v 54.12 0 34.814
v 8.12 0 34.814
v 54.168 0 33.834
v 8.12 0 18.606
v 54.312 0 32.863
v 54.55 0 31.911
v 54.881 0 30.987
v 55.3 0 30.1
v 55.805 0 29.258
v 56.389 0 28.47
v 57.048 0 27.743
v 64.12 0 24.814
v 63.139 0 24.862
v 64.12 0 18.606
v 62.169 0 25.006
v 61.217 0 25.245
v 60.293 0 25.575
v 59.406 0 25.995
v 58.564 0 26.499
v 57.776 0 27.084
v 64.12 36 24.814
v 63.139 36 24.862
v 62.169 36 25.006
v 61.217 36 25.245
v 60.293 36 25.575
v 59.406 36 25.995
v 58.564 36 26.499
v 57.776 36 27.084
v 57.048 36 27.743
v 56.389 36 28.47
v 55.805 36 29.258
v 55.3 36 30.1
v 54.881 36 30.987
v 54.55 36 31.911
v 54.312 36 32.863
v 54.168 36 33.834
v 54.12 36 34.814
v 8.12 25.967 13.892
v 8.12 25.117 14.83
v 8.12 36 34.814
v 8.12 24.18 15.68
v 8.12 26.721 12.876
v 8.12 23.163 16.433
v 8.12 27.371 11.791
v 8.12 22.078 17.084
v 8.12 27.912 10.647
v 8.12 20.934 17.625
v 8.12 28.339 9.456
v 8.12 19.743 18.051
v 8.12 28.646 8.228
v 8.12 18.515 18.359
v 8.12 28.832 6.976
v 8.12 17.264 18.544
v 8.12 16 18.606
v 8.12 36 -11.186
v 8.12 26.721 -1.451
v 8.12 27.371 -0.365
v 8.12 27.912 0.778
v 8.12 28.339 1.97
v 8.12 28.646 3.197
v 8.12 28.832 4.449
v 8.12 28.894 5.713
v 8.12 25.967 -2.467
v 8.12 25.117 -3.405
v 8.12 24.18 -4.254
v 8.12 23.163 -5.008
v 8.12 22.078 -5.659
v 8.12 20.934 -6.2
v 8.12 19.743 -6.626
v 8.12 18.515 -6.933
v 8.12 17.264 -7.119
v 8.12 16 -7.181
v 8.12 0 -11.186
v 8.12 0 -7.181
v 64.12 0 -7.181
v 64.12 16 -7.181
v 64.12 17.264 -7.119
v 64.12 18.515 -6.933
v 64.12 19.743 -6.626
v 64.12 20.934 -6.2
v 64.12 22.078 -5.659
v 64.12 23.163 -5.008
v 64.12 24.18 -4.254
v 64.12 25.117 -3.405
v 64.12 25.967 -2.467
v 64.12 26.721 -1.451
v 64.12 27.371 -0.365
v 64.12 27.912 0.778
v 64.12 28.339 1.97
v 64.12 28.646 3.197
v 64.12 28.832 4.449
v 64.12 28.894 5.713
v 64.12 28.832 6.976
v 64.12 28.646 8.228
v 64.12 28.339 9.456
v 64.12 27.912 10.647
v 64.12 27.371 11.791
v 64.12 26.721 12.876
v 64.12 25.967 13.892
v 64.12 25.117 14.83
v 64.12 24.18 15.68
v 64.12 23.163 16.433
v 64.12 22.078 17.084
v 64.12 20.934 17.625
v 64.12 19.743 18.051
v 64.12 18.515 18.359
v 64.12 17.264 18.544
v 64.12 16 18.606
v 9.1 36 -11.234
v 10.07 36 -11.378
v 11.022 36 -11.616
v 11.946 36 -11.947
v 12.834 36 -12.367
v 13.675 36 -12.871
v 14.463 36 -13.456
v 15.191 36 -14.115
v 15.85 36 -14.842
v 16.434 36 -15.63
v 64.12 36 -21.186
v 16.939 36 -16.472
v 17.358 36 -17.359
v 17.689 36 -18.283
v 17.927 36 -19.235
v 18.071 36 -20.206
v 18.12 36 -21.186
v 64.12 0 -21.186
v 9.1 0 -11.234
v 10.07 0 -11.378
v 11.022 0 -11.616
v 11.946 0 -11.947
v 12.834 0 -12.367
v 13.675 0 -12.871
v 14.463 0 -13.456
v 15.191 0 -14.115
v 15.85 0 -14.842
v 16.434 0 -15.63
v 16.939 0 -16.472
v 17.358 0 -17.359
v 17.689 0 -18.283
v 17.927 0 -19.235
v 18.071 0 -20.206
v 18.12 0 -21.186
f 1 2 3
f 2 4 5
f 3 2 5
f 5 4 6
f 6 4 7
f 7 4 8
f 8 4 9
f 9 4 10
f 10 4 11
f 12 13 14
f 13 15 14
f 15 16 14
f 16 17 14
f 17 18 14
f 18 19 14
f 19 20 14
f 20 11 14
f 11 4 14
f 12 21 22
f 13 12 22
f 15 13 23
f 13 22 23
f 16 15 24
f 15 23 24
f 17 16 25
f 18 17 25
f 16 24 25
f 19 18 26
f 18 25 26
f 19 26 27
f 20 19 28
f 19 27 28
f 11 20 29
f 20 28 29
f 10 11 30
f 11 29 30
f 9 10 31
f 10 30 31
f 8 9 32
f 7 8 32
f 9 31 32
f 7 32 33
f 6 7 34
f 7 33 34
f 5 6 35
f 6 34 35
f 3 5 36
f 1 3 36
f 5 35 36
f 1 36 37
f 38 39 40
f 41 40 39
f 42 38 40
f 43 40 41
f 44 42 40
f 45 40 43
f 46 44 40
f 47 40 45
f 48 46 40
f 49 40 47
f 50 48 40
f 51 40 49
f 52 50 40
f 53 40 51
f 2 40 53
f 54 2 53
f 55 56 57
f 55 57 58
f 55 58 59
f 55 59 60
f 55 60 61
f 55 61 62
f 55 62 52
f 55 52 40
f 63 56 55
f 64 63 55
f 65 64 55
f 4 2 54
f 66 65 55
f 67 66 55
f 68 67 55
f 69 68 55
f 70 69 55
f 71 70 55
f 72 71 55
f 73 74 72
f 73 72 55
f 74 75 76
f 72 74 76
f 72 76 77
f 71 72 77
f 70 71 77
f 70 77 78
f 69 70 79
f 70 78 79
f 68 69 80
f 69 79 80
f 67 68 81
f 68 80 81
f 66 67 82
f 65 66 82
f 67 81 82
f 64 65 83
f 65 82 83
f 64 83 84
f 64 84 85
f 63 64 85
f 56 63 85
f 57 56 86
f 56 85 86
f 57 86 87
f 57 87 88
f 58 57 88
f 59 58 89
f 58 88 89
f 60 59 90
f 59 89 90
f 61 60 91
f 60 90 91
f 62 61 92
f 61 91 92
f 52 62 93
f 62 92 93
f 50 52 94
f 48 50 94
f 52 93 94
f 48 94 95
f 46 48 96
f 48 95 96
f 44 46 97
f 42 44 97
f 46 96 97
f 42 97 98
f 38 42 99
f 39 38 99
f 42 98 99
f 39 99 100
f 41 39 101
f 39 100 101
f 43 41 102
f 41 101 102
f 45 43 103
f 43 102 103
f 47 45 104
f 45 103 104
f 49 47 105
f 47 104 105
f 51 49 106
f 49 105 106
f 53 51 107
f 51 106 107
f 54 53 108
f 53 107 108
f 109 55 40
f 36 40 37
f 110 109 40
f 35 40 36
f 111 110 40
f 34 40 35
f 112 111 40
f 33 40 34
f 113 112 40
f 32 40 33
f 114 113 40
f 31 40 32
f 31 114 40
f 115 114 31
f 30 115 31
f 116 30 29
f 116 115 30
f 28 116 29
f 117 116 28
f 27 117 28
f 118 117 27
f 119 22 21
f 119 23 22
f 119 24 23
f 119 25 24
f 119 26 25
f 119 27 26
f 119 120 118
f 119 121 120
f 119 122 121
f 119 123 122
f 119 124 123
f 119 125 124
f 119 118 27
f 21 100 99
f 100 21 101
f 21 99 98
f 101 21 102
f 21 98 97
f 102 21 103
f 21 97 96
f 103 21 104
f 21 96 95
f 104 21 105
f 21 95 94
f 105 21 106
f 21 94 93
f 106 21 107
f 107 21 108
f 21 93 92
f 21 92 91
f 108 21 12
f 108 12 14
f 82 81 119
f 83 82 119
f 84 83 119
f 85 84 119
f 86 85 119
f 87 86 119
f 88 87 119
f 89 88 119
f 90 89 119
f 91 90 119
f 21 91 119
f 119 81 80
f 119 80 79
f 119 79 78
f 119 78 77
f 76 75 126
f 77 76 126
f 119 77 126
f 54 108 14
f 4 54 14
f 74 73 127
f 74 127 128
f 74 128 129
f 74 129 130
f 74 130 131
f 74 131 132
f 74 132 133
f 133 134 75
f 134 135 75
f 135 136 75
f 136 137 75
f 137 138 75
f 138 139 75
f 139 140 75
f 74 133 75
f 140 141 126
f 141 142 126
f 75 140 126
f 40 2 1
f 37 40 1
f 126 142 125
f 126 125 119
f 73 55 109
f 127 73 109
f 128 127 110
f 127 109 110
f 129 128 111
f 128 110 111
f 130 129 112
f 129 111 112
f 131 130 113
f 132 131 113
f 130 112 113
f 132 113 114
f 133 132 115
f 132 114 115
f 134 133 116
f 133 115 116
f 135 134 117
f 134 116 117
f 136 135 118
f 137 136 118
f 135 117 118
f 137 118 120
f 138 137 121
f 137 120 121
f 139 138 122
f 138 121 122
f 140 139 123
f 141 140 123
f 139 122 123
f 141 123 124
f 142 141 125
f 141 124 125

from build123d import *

# Parameters (mm, degrees)
SKETCH_1_W          = 56
SKETCH_1_H          = 56
EXTRUDE_1_DEPTH     = 36
SKETCH_3_R          = 12.893800992
CUT_EXTRUDE_5_DEPTH = 56
CUT_EXTRUDE_6_DEPTH = 56


with BuildPart() as part:
    # 草图1 → 凸台-拉伸1 (new body)
    with BuildSketch(Plane(origin=(0, 0, 0), x_dir=(1, 0, 0), z_dir=(0, 1, 0))):
        with Locations((36.119558337, -6.81415619)):
            Rectangle(SKETCH_1_W, SKETCH_1_H)
    extrude(amount=EXTRUDE_1_DEPTH)

    # 草图3 → 切除-拉伸5 (cut)
    with BuildSketch(Plane(origin=(64.119558337, 0, 0), x_dir=(0, 0, -1), z_dir=(1, 0, 0))):
        with Locations((-5.712666973, 16)):
            Circle(SKETCH_3_R)
        with BuildLine():
            ThreePointArc((7.181134019, 16), (-5.712666973, 3.106199008), (-18.606467966, 16))
            Line((-18.606467966, 16), (-18.606467966, 0))
            Line((-18.606467966, 0), (7.181134019, 0))
            Line((7.181134019, 0), (7.181134019, 16))
        make_face()
    extrude(amount=-CUT_EXTRUDE_5_DEPTH, mode=Mode.SUBTRACT)

    # 草图5 → 切除-拉伸6 (cut)
    with BuildSketch(Plane(origin=(0, 36, 0), x_dir=(1, 0, 0), z_dir=(0, 1, 0))):
        with BuildLine():
            ThreePointArc((54.119558337, -34.81415619), (64.119558337, -44.81415619), (74.119558337, -34.81415619))
            ThreePointArc((74.119558337, -34.81415619), (71.190626149, -27.743088379), (64.119558337, -24.81415619))
            Line((64.119558337, -24.81415619), (64.119558337, -34.81415619))
            Line((64.119558337, -34.81415619), (54.119558337, -34.81415619))
        make_face()
        with BuildLine():
            Line((64.119558337, -34.81415619), (64.119558337, -24.81415619))
            ThreePointArc((64.119558337, -24.81415619), (57.048490525, -27.743088379), (54.119558337, -34.81415619))
            Line((54.119558337, -34.81415619), (64.119558337, -34.81415619))
        make_face()
        with BuildLine():
            Line((8.119558337, 21.18584381), (18.119558337, 21.18584381))
            ThreePointArc((18.119558337, 21.18584381), (1.048490525, 28.256911621), (8.119558337, 11.18584381))
            Line((8.119558337, 11.18584381), (8.119558337, 21.18584381))
        make_face()
        with BuildLine():
            ThreePointArc((8.119558337, 11.18584381), (15.190626149, 14.114775998), (18.119558337, 21.18584381))
            Line((18.119558337, 21.18584381), (8.119558337, 21.18584381))
            Line((8.119558337, 21.18584381), (8.119558337, 11.18584381))
        make_face()
    extrude(amount=-CUT_EXTRUDE_6_DEPTH, mode=Mode.SUBTRACT)


solid = part.part
